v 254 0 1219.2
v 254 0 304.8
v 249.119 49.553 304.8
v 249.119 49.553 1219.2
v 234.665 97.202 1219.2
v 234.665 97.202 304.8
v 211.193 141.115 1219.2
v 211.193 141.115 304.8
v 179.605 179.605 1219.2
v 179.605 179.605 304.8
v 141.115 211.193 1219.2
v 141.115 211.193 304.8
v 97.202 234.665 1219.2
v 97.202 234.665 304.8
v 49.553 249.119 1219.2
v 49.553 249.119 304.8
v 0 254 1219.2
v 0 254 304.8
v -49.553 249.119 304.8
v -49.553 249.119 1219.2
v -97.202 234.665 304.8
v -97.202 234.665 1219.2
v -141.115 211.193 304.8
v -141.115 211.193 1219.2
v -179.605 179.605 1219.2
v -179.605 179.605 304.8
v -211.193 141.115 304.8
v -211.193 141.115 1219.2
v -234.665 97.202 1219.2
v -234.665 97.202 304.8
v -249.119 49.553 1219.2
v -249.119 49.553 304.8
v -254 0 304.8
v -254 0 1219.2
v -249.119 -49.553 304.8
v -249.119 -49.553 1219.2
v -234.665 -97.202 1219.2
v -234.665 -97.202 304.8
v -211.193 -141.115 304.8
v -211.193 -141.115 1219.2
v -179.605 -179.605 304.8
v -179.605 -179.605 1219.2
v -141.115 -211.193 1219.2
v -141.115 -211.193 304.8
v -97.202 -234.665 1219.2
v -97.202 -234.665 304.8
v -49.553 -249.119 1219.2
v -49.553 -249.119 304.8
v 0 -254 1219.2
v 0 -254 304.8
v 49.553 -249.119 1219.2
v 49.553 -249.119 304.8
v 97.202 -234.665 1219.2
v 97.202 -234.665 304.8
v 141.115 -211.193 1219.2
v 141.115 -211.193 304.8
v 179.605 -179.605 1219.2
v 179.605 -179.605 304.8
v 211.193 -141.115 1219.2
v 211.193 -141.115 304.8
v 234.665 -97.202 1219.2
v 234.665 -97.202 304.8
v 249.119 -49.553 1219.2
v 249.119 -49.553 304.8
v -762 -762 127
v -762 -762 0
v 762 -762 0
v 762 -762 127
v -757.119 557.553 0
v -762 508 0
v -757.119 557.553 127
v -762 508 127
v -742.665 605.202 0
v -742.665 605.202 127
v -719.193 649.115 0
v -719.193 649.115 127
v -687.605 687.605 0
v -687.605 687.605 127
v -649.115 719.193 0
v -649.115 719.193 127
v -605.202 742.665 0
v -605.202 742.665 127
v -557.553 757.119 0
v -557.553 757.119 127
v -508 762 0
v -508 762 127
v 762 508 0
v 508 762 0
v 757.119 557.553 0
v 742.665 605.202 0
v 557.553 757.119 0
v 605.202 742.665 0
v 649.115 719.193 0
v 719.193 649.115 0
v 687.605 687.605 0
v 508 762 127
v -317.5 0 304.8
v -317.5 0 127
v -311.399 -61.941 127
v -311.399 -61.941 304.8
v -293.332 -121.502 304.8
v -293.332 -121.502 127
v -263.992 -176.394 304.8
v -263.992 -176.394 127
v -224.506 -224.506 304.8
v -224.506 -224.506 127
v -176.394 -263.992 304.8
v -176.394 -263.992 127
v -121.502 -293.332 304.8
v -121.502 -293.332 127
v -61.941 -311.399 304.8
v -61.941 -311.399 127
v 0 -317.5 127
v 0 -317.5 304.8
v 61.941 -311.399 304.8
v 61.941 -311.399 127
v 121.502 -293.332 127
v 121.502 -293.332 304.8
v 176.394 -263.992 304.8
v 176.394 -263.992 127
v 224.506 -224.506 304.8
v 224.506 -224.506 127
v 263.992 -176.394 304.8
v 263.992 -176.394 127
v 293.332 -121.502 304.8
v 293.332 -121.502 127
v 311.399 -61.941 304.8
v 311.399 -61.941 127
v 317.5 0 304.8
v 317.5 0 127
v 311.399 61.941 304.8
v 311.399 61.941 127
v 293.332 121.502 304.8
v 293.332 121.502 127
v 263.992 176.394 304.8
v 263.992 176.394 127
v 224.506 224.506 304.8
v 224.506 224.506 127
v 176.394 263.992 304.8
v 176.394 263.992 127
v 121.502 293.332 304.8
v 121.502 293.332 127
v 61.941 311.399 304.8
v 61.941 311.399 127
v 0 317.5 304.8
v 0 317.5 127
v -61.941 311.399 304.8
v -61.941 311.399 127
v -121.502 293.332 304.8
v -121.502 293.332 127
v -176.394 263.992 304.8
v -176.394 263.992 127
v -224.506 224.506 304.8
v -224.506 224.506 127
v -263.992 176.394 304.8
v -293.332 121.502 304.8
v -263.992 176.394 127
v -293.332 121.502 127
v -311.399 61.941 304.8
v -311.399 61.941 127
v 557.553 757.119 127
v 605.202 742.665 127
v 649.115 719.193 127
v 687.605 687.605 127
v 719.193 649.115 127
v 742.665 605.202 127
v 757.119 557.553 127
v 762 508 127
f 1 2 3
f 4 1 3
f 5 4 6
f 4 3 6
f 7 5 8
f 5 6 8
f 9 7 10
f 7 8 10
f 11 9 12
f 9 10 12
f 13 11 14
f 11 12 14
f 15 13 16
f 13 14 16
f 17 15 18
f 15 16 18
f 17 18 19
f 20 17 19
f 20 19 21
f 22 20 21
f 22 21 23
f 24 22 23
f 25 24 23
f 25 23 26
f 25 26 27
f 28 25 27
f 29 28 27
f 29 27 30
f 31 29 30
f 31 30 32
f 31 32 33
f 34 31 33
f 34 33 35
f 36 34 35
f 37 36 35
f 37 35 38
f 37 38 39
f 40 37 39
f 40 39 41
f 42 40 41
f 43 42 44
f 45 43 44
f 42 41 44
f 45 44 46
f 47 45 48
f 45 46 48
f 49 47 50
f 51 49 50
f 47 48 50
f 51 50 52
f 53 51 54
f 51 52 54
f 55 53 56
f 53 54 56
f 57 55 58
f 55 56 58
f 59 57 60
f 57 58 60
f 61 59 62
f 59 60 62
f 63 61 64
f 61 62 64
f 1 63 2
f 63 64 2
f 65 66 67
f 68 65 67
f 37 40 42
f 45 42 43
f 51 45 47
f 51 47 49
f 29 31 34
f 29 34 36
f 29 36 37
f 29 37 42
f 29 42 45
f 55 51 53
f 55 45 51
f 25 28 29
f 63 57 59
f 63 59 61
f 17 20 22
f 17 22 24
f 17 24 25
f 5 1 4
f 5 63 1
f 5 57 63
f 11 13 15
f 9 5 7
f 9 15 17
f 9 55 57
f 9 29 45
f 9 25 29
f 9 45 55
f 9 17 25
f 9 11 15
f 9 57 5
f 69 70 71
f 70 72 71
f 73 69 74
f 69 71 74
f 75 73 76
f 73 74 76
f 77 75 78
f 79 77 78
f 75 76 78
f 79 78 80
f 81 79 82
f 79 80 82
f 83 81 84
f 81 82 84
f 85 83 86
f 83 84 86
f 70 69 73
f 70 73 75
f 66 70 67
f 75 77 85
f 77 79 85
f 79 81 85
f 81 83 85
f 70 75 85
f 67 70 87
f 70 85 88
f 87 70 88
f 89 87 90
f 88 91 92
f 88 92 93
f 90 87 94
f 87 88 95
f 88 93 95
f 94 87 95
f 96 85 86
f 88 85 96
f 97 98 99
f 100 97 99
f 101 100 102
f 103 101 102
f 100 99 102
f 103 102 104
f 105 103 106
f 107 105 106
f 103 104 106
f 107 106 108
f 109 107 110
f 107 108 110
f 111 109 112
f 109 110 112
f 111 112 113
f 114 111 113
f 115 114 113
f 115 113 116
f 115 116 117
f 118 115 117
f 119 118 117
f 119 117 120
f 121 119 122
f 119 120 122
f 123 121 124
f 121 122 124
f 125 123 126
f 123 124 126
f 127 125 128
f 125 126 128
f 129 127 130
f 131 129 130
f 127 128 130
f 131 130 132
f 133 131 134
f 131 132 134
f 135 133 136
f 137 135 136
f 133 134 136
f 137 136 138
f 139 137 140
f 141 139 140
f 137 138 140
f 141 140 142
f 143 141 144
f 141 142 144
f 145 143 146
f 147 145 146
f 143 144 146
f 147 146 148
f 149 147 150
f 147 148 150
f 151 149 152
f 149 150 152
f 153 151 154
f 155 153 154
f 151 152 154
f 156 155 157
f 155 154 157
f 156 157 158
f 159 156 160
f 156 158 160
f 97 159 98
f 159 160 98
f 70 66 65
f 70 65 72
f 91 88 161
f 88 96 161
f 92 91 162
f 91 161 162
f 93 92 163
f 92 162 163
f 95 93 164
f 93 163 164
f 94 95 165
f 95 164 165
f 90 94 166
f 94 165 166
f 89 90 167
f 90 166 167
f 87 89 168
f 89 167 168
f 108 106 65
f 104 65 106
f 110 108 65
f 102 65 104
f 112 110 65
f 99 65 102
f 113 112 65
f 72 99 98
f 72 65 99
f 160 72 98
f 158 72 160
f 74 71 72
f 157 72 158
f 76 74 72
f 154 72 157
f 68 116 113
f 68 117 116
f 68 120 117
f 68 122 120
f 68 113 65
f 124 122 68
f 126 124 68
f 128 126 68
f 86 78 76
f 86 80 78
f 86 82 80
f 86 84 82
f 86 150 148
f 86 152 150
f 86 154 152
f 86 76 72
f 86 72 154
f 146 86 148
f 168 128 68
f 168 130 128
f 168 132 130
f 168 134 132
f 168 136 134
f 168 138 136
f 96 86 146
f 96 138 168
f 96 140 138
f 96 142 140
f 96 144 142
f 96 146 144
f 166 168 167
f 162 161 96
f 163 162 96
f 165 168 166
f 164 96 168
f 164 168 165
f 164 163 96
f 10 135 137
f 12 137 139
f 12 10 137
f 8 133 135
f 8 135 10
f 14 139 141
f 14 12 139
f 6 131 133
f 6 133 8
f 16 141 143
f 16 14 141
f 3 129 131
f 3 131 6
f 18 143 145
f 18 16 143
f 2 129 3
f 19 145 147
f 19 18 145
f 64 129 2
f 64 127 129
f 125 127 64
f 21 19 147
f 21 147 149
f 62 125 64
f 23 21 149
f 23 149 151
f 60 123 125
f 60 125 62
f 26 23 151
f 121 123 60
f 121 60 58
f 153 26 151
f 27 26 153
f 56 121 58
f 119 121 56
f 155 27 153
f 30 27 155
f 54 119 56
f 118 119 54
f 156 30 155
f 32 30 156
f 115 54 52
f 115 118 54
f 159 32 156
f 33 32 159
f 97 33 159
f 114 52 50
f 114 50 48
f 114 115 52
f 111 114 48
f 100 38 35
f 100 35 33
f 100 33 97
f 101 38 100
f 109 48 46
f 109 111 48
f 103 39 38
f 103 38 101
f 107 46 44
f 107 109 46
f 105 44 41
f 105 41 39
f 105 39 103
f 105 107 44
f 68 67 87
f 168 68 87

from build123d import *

# Parameters (mm, degrees)
SKETCH1_W           = 1524
SKETCH1_H           = 1524
BOSS_EXTRUDE1_DEPTH = 127
SKETCH2_R           = 254
BOSS_EXTRUDE2_DEPTH = 1092.2
SKETCH3_R           = 317.5
BOSS_EXTRUDE3_DEPTH = 177.8
FILLET1_R           = 254


with BuildPart() as part:
    # Sketch1 → Boss-Extrude1 (new body)
    with BuildSketch(Plane.XY):
        Rectangle(SKETCH1_W, SKETCH1_H)
    extrude(amount=BOSS_EXTRUDE1_DEPTH)

    # Sketch2 → Boss-Extrude2 (add)
    with BuildSketch(Plane.XY.offset(127)):
        Circle(SKETCH2_R)
    extrude(amount=BOSS_EXTRUDE2_DEPTH)

    # Sketch3 → Boss-Extrude3 (add)
    with BuildSketch(Plane.XY.offset(127)):
        with Locations(Location((0, 0, 0), (0, 0, 180))):
            Circle(SKETCH3_R)
    extrude(amount=BOSS_EXTRUDE3_DEPTH)

    # Fillet1
    fillet1_edges = [part.edges().sort_by_distance(p)[0] for p in [
        (-762, 762, 63.5),
        (762, 762, 63.5),
    ]]
    fillet(fillet1_edges, radius=FILLET1_R)


solid = part.part
